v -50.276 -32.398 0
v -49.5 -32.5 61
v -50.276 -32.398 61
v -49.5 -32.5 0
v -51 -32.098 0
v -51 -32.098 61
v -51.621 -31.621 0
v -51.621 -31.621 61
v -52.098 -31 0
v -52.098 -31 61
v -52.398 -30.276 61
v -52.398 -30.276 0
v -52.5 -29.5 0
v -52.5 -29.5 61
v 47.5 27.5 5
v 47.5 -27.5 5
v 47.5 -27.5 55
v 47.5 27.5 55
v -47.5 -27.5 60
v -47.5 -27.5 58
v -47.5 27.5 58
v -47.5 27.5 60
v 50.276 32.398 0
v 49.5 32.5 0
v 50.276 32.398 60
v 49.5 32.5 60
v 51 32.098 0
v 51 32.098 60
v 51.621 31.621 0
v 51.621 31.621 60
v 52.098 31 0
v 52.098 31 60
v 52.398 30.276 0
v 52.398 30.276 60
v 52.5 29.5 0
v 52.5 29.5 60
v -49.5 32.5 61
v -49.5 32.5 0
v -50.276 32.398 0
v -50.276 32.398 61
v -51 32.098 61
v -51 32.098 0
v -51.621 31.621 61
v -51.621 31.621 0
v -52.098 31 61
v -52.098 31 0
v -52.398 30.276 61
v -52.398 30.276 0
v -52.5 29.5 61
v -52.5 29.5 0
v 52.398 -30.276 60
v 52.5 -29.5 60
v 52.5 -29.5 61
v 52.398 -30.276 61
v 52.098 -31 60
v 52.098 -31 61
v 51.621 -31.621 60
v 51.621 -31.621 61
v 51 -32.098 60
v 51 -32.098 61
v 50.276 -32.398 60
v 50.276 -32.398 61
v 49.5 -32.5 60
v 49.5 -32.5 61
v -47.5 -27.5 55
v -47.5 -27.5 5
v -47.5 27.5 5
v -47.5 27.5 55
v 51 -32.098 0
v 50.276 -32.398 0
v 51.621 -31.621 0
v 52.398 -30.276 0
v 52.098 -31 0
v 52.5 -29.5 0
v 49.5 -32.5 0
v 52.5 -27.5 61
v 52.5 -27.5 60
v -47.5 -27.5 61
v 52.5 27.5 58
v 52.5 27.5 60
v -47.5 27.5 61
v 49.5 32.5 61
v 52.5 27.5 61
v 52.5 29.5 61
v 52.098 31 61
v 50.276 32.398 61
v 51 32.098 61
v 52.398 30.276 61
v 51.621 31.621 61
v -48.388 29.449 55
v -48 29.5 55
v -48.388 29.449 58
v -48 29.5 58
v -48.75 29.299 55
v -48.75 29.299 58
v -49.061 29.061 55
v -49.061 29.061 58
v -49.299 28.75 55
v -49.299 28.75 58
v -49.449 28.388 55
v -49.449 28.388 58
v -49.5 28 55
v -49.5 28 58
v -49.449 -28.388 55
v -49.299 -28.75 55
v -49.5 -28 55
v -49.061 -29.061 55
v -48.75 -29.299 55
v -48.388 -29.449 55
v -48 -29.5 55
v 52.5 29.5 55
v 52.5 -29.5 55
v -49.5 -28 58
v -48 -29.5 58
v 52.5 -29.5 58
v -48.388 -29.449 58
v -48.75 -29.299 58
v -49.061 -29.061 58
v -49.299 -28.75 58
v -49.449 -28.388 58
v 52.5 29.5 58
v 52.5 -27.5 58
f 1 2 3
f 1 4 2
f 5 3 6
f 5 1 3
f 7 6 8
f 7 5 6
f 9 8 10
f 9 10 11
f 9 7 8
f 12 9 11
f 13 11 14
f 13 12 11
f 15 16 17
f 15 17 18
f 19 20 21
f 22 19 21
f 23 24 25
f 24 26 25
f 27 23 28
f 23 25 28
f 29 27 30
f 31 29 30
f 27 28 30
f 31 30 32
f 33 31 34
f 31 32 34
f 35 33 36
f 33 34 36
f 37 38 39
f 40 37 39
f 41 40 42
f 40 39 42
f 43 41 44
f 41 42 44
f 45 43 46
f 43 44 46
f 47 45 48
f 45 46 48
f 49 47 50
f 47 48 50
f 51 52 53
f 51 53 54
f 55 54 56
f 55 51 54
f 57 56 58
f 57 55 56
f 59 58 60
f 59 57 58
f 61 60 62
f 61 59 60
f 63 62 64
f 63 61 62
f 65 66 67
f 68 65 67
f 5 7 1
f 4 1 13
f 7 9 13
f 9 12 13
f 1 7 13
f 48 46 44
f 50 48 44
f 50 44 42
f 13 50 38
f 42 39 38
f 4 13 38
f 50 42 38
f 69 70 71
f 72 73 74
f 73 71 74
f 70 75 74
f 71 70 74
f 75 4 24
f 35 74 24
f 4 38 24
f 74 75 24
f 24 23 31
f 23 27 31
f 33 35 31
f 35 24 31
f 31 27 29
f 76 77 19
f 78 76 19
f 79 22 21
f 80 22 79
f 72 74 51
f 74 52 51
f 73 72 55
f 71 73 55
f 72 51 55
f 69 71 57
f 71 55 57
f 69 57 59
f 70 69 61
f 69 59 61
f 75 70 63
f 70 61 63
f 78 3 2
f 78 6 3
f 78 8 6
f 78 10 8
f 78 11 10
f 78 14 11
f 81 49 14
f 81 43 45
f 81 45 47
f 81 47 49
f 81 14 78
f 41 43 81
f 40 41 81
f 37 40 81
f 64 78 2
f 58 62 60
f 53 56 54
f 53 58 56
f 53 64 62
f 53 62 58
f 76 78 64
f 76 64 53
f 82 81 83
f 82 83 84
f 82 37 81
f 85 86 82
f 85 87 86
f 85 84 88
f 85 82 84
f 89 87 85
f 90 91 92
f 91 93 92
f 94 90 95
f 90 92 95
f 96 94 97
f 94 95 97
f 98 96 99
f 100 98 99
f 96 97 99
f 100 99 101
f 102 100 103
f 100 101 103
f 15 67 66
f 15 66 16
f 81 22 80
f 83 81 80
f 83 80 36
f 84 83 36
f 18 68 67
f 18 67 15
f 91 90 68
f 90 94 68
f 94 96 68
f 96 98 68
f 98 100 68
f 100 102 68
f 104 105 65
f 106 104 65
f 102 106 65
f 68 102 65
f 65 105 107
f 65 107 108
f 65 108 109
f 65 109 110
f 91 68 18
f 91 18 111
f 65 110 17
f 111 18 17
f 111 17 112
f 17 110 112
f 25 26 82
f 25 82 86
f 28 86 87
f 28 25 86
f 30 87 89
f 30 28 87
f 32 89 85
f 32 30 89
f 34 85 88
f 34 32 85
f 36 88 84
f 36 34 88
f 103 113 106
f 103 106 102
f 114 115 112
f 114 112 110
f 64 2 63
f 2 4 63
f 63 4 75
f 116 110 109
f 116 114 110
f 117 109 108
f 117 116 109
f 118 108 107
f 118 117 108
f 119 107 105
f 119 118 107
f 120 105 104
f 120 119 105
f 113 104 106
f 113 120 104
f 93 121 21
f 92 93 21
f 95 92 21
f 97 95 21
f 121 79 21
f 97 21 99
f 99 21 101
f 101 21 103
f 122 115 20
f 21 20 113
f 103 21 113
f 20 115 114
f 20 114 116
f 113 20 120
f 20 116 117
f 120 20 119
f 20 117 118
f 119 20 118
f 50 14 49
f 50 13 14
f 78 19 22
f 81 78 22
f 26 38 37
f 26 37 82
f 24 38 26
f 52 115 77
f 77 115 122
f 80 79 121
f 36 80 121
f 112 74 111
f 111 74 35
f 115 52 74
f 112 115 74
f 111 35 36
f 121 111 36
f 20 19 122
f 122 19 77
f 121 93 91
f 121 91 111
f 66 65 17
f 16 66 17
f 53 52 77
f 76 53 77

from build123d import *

# Parameters (mm, degrees)
F0_W      = 105
F0_H      = 65
F0_W_2    = 95
F0_H_2    = 55
F1_DEPTH  = 60
F2_DEPTH  = 5
F3_W      = 5
F3_H      = 55
F4_DEPTH  = 5
F6_DEPTH  = 2
F8_DEPTH  = 2
F10_DEPTH = 2
F11_R     = 2.99999
F12_R     = 1.5
F13_DEPTH = 1


# Not quite as in the source:
# - a fillet or chamfer is up to 0.001 mm smaller than in the source, because OpenCascade refuses the exact size


with BuildPart() as f1:
    # F0 (on Top) → F1 (new body)
    with BuildSketch(Plane.XY):
        Rectangle(F0_W, F0_H)
        Rectangle(F0_W_2, F0_H_2, mode=Mode.SUBTRACT)
    extrude(amount=F1_DEPTH)

    # F0 (on Top) → F2 (join)
    with BuildSketch(Plane.XY):
        Rectangle(F0_W_2, F0_H_2)
    extrude(amount=F2_DEPTH)

    # F3 (on face) → F4 (cut)
    with BuildSketch(Plane.XY.offset(60)):
        with Locations((50, 0)):
            Rectangle(F3_W, F3_H)
    extrude(amount=-F4_DEPTH, mode=Mode.SUBTRACT)

    # F5 (on face) → F6 (cut)
    with BuildSketch(Plane.XZ.offset(-27.5)):
        Polygon((47.5, 55), (52.5, 55), (52.5, 58), (-47.5, 58), (-47.5, 55), align=None)
    extrude(amount=-F6_DEPTH, mode=Mode.SUBTRACT)

    # F7 (on face) → F8 (cut)
    with BuildSketch(Plane.YZ.offset(-47.5)):
        Polygon((27.5, 55), (29.5, 55), (29.5, 58), (27.5, 58), (-27.5, 58), (-27.5, 55), align=None)
    extrude(amount=-F8_DEPTH, mode=Mode.SUBTRACT)

    # F9 (on face) → F10 (cut)
    with BuildSketch(Plane(origin=(0, -27.5, 0), x_dir=(-1, 0, 0), z_dir=(0, 1, 0))):
        Polygon((47.5, 55), (49.5, 55), (49.5, 58), (47.5, 58), (-52.5, 58), (-52.5, 55), (-47.5, 55), align=None)
    extrude(amount=-F10_DEPTH, mode=Mode.SUBTRACT)

    # F11 (radius 3 in the source; OpenCascade refuses exactly that, so slightly less here)
    f11_edges = [f1.edges().sort_by_distance(p)[0] for p in [
        (-52.5, -32.5, 30),
        (-52.5, 32.5, 30),
        (52.5, 32.5, 30),
        (52.5, -32.5, 30),
    ]]
    fillet(f11_edges, radius=F11_R)

    # F12
    f12_edges = [f1.edges().sort_by_distance(p)[0] for p in [
        (-49.5, -29.5, 56.5),
        (-49.5, 29.5, 56.5),
    ]]
    fillet(f12_edges, radius=F12_R)

    # F13 (add): a face of the model
    f13_faces = [f1.faces().sort_by_distance(p)[0] for p in [
        (-51.2650910965, 0, 60),
    ]]
    extrude(f13_faces, amount=F13_DEPTH)


solid = f1.part
